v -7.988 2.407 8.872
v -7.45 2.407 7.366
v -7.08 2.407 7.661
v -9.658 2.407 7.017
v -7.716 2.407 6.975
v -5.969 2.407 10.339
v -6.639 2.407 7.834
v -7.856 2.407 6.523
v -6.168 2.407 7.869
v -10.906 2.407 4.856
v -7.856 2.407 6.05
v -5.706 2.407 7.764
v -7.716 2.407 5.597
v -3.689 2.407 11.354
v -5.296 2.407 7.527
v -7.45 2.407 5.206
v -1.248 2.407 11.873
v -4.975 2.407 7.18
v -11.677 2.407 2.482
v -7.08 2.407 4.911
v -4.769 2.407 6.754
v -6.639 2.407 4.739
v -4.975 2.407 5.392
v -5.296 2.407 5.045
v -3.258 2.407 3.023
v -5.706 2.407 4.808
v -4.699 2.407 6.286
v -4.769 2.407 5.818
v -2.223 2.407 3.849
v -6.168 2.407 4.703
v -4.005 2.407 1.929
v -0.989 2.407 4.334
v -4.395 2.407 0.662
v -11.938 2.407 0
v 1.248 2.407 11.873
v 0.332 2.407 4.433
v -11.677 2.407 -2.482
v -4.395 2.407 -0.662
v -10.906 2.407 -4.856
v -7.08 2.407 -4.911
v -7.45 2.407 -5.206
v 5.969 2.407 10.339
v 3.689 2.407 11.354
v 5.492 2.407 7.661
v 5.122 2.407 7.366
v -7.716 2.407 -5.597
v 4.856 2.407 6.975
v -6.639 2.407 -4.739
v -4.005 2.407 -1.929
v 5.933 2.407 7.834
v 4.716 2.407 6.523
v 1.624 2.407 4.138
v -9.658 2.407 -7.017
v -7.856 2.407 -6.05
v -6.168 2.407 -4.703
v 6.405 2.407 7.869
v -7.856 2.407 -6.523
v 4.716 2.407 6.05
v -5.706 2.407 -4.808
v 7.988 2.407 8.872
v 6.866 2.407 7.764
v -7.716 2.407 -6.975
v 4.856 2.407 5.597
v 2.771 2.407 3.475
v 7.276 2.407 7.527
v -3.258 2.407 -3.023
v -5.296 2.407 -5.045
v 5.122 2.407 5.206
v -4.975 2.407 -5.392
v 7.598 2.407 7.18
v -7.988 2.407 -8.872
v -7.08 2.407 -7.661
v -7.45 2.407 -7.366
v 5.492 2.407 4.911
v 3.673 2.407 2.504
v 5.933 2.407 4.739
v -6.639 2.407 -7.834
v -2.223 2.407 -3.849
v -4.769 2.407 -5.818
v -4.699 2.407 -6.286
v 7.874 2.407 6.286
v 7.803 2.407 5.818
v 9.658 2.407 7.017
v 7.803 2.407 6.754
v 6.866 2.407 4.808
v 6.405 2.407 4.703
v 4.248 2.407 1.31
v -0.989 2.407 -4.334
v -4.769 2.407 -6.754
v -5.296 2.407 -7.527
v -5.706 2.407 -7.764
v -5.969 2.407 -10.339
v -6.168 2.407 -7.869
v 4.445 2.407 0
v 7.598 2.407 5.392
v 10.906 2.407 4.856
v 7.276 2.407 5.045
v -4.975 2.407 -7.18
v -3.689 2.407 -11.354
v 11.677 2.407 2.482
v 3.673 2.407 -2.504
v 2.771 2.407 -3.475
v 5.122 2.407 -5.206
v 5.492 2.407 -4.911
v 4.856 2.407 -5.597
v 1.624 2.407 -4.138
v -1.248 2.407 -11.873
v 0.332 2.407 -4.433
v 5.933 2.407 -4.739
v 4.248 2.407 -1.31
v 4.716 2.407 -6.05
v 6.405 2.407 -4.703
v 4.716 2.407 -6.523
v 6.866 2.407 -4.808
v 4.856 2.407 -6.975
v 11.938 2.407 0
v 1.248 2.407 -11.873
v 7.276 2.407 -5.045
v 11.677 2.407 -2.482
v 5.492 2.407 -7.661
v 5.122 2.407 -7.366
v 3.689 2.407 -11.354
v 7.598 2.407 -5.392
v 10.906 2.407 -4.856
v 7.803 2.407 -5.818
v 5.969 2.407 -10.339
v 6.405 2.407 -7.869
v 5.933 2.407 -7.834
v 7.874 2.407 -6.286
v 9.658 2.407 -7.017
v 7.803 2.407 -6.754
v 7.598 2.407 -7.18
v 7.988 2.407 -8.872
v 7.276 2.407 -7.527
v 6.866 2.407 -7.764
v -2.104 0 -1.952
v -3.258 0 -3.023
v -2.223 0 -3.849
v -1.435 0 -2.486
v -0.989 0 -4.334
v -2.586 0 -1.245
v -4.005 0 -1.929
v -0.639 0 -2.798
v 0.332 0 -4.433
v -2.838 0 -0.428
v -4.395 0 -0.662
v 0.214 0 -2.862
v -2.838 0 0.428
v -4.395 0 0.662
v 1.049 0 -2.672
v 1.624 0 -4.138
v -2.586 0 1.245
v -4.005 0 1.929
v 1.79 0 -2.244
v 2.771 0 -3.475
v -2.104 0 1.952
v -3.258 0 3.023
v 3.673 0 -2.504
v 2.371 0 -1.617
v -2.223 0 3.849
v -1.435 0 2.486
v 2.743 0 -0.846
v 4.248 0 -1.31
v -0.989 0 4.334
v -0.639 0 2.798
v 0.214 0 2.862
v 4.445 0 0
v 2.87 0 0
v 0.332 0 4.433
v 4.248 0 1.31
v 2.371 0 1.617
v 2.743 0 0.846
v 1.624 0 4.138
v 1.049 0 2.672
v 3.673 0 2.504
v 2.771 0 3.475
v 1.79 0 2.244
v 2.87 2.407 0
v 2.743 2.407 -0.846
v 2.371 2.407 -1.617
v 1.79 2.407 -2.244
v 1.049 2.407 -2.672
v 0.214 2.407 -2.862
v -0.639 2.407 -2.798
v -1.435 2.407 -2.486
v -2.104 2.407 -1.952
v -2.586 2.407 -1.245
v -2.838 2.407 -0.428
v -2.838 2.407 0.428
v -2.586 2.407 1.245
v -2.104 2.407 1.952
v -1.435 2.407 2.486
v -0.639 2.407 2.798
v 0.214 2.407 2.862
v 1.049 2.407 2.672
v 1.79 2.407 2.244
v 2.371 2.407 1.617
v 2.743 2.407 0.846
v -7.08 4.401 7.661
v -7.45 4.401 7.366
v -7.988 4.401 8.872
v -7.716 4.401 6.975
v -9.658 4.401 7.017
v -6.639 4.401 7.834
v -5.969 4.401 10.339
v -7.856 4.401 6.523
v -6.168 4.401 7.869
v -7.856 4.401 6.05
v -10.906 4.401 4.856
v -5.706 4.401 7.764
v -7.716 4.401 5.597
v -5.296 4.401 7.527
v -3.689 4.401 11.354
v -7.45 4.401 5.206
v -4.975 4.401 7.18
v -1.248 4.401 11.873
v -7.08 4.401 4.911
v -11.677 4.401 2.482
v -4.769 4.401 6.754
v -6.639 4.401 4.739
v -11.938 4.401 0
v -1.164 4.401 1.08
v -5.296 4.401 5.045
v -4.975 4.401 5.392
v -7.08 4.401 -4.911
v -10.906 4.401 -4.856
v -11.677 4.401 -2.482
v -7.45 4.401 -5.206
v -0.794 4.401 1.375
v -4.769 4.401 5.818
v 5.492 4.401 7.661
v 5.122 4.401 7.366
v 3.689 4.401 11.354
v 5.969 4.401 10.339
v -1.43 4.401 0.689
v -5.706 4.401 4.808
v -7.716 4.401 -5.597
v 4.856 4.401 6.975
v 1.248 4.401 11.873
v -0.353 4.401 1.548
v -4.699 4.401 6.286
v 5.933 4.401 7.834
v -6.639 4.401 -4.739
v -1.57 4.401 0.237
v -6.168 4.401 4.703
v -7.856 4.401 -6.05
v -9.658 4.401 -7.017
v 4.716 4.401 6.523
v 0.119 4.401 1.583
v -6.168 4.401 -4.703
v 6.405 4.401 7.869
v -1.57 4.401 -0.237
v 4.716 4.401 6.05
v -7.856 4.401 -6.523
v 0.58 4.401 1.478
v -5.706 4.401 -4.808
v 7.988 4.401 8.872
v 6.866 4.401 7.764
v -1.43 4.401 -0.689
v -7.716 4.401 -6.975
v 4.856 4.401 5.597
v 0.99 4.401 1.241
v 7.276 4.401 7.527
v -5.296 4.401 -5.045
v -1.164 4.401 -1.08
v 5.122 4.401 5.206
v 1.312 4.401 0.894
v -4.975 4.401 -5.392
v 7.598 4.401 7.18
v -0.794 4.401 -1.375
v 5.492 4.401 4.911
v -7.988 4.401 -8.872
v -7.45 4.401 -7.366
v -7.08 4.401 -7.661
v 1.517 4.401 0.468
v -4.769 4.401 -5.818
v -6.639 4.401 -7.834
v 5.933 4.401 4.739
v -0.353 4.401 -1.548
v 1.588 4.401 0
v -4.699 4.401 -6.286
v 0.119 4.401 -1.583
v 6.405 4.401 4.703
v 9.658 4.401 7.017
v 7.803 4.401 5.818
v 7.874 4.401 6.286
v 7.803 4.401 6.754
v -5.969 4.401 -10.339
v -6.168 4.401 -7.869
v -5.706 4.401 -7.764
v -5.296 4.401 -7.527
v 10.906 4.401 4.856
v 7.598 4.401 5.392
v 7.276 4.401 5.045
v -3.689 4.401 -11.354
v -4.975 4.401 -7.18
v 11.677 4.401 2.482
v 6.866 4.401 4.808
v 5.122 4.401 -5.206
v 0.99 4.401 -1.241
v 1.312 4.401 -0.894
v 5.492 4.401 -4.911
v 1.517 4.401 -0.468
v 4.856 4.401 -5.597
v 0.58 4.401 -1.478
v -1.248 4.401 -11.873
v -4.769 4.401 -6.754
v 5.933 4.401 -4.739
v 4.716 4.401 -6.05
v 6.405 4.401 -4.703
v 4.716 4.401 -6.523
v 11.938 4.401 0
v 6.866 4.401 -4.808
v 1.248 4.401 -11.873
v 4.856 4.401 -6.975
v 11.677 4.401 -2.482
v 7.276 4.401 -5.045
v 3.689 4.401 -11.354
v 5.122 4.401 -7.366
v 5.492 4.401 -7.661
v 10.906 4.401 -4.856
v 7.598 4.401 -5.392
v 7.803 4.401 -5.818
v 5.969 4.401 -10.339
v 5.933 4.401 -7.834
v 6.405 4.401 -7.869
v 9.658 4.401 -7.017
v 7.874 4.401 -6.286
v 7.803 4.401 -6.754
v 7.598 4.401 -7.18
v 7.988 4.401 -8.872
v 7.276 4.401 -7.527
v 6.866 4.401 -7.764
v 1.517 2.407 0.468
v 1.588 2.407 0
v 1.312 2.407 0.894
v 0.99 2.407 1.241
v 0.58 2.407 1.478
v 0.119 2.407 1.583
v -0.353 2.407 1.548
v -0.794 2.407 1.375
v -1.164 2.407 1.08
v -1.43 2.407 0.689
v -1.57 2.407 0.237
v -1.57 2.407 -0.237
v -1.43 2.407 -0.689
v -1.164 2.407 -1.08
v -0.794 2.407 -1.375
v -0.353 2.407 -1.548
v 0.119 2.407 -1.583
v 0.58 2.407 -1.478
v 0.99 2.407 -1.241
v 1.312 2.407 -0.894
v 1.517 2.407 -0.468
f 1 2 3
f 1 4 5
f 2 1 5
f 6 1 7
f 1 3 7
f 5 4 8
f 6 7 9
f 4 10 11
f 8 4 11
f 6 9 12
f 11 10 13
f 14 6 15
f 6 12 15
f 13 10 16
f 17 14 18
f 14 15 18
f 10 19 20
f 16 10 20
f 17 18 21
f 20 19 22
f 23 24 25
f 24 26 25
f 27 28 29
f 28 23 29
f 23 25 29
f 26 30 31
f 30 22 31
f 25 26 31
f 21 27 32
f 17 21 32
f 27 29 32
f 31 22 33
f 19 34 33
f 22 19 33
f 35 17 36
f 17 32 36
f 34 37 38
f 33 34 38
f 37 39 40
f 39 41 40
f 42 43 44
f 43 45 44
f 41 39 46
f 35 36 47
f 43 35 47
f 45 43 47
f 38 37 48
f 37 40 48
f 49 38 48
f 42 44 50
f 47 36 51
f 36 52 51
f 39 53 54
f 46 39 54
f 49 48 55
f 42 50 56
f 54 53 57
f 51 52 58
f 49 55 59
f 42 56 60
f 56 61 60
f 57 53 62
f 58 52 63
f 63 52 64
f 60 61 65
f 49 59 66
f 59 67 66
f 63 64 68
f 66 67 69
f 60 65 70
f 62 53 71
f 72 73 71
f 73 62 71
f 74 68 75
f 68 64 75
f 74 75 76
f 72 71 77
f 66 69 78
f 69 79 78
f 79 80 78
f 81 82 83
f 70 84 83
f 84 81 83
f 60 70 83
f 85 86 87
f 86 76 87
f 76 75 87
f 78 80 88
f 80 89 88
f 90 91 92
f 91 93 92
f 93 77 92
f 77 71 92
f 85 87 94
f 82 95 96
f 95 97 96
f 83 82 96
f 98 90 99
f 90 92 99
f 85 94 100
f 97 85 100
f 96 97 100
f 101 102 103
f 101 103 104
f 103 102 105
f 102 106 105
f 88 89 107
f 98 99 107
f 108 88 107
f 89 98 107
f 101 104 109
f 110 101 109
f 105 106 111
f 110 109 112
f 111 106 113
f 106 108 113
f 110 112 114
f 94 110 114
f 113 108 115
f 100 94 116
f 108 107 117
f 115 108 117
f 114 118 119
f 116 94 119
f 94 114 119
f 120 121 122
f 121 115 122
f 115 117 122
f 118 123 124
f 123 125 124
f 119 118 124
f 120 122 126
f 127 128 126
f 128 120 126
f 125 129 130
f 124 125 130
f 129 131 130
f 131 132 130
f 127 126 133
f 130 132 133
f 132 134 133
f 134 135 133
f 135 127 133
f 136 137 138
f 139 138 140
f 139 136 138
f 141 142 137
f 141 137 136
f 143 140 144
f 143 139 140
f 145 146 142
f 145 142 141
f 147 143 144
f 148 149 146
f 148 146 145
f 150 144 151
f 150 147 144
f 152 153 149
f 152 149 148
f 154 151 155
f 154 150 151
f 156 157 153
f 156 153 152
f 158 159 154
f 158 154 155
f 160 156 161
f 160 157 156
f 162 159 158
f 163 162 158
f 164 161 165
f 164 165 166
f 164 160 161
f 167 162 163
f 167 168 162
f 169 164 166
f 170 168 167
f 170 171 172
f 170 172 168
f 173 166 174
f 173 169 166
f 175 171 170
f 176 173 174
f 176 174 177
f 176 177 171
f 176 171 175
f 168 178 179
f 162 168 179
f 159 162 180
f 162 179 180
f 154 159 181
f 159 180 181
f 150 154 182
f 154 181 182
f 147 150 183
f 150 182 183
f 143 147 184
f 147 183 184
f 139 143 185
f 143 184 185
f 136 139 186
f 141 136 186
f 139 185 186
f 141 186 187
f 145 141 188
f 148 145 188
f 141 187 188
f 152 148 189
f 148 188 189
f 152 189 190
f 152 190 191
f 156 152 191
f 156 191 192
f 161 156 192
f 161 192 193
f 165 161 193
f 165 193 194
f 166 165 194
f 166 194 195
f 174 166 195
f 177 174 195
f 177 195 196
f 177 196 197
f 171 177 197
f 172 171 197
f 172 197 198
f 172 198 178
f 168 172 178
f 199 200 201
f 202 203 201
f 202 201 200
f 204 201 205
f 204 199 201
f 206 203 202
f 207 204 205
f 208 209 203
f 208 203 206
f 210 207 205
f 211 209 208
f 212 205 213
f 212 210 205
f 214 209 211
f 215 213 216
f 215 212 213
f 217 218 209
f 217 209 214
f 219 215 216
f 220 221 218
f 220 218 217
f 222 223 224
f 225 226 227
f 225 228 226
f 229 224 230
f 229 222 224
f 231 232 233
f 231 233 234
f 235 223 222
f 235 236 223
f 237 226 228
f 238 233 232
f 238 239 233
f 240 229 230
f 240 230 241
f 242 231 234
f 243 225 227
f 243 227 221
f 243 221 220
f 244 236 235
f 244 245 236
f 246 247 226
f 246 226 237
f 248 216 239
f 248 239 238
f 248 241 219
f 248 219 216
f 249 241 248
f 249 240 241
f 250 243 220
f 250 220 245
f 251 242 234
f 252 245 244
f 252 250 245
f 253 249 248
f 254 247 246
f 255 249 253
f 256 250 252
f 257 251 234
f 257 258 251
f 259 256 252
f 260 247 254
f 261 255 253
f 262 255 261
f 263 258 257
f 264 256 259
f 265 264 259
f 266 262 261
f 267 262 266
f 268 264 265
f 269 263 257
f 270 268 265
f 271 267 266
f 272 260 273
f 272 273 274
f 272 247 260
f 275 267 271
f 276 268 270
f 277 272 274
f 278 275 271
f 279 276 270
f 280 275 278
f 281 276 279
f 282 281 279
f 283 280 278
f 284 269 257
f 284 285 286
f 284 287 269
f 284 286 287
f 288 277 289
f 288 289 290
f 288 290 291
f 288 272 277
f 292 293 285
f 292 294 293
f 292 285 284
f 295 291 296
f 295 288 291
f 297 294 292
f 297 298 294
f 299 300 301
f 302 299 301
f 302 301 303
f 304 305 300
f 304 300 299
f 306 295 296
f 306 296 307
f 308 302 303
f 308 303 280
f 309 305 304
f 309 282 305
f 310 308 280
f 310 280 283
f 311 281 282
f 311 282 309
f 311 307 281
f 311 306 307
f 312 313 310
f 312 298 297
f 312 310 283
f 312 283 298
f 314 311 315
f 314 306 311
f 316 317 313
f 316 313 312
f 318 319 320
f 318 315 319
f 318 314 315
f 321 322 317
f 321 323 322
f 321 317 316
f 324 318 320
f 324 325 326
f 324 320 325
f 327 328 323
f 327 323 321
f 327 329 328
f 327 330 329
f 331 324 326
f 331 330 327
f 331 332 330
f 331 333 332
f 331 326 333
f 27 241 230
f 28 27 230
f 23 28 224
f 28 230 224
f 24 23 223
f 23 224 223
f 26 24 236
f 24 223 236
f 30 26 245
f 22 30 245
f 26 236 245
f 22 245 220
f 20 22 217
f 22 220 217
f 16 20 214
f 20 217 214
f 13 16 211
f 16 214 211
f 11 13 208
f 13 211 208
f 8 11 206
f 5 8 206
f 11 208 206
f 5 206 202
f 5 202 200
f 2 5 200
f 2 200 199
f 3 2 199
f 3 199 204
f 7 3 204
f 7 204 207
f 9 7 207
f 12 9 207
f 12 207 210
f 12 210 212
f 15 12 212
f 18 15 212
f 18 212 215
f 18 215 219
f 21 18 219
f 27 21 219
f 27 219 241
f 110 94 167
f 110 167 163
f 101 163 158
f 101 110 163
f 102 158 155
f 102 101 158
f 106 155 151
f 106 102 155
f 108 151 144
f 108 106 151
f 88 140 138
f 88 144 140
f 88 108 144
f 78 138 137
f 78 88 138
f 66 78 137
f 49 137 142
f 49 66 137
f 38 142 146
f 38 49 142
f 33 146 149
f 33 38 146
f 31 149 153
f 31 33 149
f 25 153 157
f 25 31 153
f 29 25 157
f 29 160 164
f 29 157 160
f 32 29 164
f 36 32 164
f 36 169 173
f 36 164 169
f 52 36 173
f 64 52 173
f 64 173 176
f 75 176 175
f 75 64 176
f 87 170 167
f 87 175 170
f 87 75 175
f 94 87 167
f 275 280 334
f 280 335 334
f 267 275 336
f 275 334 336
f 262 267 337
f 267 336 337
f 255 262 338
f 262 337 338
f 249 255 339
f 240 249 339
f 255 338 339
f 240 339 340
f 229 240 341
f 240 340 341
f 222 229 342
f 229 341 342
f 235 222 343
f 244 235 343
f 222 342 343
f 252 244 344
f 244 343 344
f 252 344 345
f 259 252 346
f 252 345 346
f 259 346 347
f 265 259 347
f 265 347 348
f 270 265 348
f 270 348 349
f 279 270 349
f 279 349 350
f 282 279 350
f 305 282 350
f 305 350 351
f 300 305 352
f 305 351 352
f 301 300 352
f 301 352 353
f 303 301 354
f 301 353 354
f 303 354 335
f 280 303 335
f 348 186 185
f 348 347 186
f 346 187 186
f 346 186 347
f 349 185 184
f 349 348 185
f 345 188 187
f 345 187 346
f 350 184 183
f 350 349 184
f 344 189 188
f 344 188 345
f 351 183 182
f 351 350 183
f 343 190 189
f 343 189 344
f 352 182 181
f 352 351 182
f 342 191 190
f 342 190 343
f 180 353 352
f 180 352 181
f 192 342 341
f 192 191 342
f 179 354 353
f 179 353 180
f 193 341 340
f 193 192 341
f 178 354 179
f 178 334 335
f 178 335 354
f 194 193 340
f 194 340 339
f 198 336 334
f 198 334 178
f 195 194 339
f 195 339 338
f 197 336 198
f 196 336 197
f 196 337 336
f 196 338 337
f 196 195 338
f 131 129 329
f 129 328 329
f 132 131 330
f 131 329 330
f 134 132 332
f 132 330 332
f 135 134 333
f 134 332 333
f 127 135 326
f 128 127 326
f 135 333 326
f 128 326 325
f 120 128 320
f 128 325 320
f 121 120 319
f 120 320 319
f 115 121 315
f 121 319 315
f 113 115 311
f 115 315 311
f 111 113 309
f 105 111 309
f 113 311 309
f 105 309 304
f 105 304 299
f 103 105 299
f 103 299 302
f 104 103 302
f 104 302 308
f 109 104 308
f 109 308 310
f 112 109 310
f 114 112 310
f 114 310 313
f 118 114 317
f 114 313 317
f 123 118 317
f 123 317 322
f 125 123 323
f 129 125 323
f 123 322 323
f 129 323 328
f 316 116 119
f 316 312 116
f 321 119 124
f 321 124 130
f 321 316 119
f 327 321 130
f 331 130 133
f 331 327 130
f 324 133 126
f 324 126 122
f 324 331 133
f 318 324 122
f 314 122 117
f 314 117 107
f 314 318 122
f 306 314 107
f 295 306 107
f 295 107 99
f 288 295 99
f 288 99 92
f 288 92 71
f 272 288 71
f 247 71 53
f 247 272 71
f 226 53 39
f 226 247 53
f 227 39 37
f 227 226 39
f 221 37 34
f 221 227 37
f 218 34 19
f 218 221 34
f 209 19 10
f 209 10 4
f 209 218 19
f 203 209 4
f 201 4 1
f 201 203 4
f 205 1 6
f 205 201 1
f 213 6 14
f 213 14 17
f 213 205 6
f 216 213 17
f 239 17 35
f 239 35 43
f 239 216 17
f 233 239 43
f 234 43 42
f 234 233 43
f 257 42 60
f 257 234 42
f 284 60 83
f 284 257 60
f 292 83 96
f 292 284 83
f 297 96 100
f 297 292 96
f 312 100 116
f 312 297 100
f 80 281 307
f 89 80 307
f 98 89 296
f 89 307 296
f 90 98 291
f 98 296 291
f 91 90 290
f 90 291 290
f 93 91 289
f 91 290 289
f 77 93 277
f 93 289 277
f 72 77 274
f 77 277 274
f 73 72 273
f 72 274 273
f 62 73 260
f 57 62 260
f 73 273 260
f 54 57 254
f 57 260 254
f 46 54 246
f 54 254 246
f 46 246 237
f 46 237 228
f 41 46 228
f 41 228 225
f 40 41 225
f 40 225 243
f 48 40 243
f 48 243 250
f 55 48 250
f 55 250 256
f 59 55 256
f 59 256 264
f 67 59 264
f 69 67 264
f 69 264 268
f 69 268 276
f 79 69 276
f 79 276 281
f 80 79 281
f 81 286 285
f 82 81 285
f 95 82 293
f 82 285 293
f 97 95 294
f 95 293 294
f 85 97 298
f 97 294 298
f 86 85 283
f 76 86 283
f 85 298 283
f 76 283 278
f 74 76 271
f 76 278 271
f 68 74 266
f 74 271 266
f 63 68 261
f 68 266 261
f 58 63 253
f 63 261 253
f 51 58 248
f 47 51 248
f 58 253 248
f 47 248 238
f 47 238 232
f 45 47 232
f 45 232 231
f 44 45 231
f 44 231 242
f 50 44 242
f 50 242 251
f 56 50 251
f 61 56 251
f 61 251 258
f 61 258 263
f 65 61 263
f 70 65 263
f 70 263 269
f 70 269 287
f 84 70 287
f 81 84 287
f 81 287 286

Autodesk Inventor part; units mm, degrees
ref_plane "YZ Plane" through (0, 0, 0) normal (1, 0, 0) x (0, 1, 0)
ref_plane "XZ Plane" through (0, 0, 0) normal (0, 1, 0) x (-1, 0, 0)
ref_plane "XY Plane" through (0, 0, 0) normal (0, 0, 1) x (1, 0, 0)
sketch "Sketch1" plane through (0, 0, 0) normal (0, 1, 0) x (-1, 0, 0)
  circle A0 centre (0, 0) radius 2.8702
  dimension "d0" = 5.7404
extrude "Extrusion1" add sketch "Sketch1" along normal blind 3.4036
sketch "Sketch6" plane through (0, 3.4036, 0) normal (0, 1, 0) x (1, 0, 0)
  circle A0 centre (0, 0) radius 11.938
  dimension "d22" = 23.876
extrude "Extrusion8" add sketch "Sketch6" along normal mid plane 1.9939
sketch "Sketch7" plane through (0, 2.4067, 0) normal (0, -1, 0) x (1, 0, 0)
  circle A0 centre (0, 0) radius 4.445
  circle A1 centre (0, 0) radius 2.8702 projected
  circle A2 centre (0, 0) radius 1.5875
  dimension "d25" = 8.89
  dimension "d26" = 3.175
extrude "Extrusion9" add sketch "Sketch7" along normal up to surface (2.4067 mm away) contours A0
extrude "Extrusion10" cut sketch "Sketch7" along normal through all contours A1 | A2
extrude "Extrusion11" cut sketch "Sketch7" against normal blind 1.9939 contours A2
sketch "Sketch8" plane through (0, 4.4006, 0) normal (0, 1, 0) x (1, 0, 0)
  line L0 (0, 0) -> (-6.2862, 6.2862)
  line L1 (0, 0) -> (8.89, 0) construction
  circle A0 centre (-6.2862, 6.2862) radius 1.5875
  circle A1 centre (-6.2862, -6.2862) radius 1.5875
  circle A2 centre (6.2862, -6.2862) radius 1.5875
  circle A3 centre (6.2862, 6.2862) radius 1.5875
  dimension "d33" = 8.89
  dimension "d34" = 135
  dimension "d35" = 3.175
  dimension "d38" = 360
extrude "Extrusion12" cut sketch "Sketch8" against normal blind 1.9939
properties part number "ServoHornDisc" material "ABS Plastic"
